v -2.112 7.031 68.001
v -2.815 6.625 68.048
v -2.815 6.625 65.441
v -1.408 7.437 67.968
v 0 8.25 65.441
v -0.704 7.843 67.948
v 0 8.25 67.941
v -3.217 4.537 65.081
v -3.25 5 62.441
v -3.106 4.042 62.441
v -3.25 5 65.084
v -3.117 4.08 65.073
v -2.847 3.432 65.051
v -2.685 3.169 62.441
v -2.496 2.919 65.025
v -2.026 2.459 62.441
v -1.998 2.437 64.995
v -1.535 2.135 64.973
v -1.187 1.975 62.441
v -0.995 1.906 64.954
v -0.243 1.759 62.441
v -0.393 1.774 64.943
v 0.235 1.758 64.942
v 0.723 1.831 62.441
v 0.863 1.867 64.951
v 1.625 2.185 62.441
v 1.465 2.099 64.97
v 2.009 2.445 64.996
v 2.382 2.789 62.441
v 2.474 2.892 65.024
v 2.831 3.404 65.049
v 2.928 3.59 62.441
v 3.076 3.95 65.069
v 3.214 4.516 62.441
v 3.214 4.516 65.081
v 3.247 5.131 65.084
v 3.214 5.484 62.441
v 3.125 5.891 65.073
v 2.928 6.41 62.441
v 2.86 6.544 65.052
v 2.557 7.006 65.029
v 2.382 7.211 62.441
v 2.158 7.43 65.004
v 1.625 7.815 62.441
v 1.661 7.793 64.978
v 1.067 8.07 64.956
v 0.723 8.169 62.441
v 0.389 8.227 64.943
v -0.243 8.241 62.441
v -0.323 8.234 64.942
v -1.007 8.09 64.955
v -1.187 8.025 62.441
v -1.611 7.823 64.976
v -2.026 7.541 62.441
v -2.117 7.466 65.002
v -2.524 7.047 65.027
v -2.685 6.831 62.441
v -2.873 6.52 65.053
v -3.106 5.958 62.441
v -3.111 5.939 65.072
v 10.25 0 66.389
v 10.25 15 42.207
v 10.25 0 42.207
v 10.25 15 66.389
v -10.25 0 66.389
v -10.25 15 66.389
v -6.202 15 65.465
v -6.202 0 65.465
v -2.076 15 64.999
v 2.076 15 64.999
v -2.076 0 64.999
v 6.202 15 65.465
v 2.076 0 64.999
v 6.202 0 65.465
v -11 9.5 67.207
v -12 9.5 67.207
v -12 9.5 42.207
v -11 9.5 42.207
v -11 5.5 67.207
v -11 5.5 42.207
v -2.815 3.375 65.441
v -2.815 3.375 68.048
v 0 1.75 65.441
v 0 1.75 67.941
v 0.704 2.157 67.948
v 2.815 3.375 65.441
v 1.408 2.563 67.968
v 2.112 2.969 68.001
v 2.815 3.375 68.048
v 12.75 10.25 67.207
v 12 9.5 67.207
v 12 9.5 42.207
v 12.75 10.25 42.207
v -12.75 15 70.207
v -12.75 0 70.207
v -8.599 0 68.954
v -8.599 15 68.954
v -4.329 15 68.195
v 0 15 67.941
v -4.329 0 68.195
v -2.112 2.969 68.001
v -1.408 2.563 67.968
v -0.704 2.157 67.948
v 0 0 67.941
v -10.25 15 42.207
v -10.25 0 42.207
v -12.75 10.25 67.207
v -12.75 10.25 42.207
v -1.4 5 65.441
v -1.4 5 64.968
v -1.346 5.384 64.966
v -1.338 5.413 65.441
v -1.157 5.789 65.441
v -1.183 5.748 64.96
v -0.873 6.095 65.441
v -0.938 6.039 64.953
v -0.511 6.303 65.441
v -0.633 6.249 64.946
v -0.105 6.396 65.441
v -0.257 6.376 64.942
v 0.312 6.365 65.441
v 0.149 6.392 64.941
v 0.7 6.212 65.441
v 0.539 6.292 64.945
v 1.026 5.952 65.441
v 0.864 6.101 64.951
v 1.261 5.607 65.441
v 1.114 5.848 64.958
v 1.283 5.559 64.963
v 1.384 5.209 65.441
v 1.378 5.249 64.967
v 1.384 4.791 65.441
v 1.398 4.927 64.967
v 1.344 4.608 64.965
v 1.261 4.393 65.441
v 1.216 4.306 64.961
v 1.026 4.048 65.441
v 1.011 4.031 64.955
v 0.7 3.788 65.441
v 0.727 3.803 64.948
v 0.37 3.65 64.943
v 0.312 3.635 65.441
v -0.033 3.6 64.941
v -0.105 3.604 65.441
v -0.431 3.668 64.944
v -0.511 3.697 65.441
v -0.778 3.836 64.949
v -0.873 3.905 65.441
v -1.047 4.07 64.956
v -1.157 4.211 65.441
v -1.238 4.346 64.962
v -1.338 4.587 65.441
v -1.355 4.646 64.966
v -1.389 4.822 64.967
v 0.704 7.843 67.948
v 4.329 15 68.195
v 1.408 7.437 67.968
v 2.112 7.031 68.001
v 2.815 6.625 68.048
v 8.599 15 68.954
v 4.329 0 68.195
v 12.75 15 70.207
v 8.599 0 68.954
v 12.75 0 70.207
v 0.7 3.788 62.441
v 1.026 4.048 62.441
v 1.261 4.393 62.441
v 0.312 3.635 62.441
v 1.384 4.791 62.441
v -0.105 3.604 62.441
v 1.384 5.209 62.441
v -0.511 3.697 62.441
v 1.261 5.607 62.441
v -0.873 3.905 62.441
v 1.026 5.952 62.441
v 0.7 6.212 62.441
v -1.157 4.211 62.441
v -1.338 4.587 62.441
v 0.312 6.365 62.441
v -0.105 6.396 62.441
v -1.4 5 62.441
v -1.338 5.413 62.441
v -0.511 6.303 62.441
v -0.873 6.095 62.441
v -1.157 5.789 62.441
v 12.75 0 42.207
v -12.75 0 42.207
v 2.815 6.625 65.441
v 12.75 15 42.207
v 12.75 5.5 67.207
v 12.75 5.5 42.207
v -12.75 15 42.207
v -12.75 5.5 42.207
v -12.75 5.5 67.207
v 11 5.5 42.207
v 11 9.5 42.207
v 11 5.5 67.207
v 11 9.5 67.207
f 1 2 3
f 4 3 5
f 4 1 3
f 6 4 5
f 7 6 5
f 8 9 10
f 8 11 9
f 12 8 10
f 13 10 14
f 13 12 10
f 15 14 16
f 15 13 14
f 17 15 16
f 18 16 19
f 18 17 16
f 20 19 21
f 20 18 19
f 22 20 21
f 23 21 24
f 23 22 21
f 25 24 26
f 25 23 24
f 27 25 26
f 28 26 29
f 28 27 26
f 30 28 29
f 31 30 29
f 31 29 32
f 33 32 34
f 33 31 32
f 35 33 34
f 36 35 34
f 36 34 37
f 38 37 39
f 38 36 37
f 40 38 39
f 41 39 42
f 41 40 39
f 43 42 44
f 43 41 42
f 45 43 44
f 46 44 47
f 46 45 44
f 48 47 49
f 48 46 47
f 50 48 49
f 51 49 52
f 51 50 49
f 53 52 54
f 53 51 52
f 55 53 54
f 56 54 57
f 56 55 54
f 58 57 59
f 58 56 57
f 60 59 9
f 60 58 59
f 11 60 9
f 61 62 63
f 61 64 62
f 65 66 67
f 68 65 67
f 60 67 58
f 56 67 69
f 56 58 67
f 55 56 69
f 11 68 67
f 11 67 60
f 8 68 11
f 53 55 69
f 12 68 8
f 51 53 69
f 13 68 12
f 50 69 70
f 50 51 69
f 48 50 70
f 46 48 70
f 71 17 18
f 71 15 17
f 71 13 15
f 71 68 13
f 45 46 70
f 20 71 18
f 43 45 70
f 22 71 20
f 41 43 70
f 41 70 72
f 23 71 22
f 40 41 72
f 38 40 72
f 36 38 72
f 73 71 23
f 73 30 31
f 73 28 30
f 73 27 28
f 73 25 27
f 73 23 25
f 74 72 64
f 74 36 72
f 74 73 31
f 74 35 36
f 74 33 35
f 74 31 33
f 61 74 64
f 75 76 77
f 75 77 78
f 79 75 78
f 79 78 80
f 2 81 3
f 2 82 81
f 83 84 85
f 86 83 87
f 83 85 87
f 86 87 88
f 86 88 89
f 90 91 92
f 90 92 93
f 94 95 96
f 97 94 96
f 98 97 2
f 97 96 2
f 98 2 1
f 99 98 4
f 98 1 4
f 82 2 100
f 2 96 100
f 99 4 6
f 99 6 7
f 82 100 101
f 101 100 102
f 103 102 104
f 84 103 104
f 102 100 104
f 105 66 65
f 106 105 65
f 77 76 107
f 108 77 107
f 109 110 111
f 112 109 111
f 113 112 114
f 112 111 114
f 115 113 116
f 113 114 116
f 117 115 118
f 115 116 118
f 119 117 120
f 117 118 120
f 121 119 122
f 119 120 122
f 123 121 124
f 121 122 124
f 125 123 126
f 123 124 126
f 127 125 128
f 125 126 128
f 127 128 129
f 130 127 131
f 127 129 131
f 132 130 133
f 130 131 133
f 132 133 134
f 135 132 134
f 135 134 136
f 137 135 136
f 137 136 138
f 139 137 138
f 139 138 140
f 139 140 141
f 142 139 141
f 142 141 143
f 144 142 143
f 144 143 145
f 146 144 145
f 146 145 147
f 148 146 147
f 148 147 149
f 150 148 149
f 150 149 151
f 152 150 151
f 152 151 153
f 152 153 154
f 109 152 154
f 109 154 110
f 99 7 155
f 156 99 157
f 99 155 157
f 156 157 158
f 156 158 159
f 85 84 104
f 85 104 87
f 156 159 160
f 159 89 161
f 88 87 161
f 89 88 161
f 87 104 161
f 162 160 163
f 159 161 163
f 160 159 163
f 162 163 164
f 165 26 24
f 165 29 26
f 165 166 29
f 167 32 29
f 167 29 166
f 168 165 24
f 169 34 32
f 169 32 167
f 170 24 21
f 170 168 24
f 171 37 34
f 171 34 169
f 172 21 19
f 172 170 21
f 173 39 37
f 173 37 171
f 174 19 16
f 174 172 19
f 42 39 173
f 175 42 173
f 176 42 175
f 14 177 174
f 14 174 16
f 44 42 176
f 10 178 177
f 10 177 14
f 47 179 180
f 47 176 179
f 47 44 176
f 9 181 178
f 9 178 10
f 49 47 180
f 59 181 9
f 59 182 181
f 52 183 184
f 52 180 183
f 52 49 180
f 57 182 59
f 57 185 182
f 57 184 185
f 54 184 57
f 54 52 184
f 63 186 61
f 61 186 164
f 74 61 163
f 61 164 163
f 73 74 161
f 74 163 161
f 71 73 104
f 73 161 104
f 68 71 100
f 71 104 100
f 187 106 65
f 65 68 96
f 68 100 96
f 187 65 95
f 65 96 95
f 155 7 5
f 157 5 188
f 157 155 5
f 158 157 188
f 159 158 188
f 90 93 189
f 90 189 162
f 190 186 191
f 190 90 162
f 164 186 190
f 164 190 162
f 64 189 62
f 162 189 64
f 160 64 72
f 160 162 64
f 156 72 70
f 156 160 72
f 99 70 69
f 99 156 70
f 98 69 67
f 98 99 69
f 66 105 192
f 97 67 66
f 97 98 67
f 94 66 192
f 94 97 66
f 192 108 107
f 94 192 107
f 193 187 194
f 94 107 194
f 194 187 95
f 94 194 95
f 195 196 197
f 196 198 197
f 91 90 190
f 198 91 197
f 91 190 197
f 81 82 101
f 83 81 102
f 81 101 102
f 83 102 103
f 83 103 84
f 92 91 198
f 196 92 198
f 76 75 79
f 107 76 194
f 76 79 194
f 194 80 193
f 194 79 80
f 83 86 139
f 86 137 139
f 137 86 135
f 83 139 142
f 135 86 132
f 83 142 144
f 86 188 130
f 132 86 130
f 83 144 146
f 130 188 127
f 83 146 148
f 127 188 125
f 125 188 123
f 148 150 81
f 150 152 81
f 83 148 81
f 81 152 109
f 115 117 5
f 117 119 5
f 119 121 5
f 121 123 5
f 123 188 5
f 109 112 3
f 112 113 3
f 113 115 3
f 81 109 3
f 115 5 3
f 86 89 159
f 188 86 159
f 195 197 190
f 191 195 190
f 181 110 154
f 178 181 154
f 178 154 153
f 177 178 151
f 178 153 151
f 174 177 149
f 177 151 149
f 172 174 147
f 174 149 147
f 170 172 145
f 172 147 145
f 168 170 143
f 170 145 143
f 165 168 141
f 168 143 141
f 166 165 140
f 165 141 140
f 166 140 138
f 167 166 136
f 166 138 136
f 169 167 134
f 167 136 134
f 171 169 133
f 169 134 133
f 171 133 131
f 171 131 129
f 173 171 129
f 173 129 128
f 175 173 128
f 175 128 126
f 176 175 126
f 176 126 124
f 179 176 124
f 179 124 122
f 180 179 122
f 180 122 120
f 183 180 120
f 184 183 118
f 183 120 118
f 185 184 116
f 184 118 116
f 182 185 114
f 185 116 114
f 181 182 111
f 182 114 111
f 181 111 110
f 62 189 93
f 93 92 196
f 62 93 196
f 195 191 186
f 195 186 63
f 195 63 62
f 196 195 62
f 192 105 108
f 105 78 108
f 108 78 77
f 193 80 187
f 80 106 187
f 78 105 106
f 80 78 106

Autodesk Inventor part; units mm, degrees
sketch "Эскиз1" plane through (0, 0, 0) normal (0, 1, 0) x (-1, 0, 0)
  line L0 (0, 56.6418) -> (23.7825, 76.5969) construction
  line L1 (44.1942, 76.014) -> (76.014, 44.1942) construction
  line L2 (91.1, 52.2091) -> (52.2091, 91.1) construction
  line L3 (0, 0) -> (74.2462, 74.2462) construction
  arc A0 (92.5543, 49.5852) -> (48.7014, 93.0224) centre (0, 0) ccw construction
  line L4 (52.2091, 91.1) -> (48.6736, 87.5645) construction
  arc A1 (44.1942, 83.085) -> (44.1942, 76.014) centre (47.7297, 79.5495) ccw construction
  line L5 (52.2091, 91.1) -> (48.6736, 87.5645) construction
  line L6 (48.6736, 87.5645) -> (52.2091, 91.1) construction
  spline S0 degree 2 poles (48.6736, 87.5645) (52.2091, 91.1) (48.7014, 93.0224) knots 1 1 1 2 2 2 construction
  line L7 (52.2091, 91.1) -> (48.7014, 93.0224) construction
  line L8 (52.2091, 91.1) -> (48.7014, 93.0224) construction
  arc A2 (48.7014, 93.0224) -> (44.0271, 95.3237) centre (0, 0) ccw construction
  arc A3 (44.0271, 95.3237) -> (43.577, 95.5303) centre (0, 0) ccw construction
  line L9 (42.6652, 95.941) -> (43.577, 95.5303) construction
  line L10 (42.6652, 95.941) -> (43.577, 95.5303) construction
  spline S1 degree 2 poles (42.0492, 94.5734) (42.6652, 95.941) (43.577, 95.5303) knots 1 1 1 2 2 2 construction
  line L11 (42.0492, 94.5734) -> (42.6652, 95.941) construction
  line L12 (42.6652, 95.941) -> (42.0492, 94.5734) construction
  line L13 (0, 0) -> (0, 209.8821) construction
  spline S2 degree 2 poles (-48.6736, 87.5645) (-52.2091, 91.1) (-48.7014, 93.0224) knots 1 1 1 2 2 2 construction
  line L14 (-48.6736, 87.5645) -> (-52.2091, 91.1) construction
  line L15 (-52.2091, 91.1) -> (-48.7014, 93.0224) construction
  arc A4 (-44.1942, 76.014) -> (-44.1942, 83.085) centre (-47.7297, 79.5495) ccw construction
  line L16 (-44.1942, 76.014) -> (-76.014, 44.1942) construction
  arc A5 (-48.7014, 93.0224) -> (-92.5543, 49.5852) centre (0, 0) ccw construction
  arc A6 (-83.085, 44.1942) -> (-76.014, 44.1942) centre (-79.5495, 47.7297) ccw construction
  line L17 (-83.085, 44.1942) -> (-87.3563, 48.4654) construction
  spline S3 degree 2 poles (-48.6736, -87.5645) (-52.2091, -91.1) (-48.7014, -93.0224) knots 1 1 1 2 2 2 construction
  line L18 (-48.6736, -87.5645) -> (-52.2091, -91.1) construction
  line L19 (-52.2091, -91.1) -> (-48.7014, -93.0224) construction
  circle A7 centre (0, 0) radius 35 construction
  line L20 (-46.3155, -73.8927) -> (-73.8927, -46.3155) construction
  arc A8 (-73.8927, -46.3155) -> (-85.2064, -46.3155) centre (-79.5495, -51.9723) ccw construction
  line L21 (-85.2064, -46.3155) -> (-87.5645, -48.6736) construction
  line L22 (-87.5645, -48.6736) -> (-91.1, -52.2091) construction
  spline S4 degree 2 poles (-87.5645, -48.6736) (-91.1, -52.2091) (-92.5543, -49.5852) knots 1 1 1 2 2 2 construction
  line L23 (-91.1, -52.2091) -> (-92.5543, -49.5852) construction
  arc A9 (-92.5543, -49.5852) -> (-48.7014, -93.0224) centre (0, 0) ccw construction
  arc A10 (-92.5543, 49.5852) -> (-92.5543, -49.5852) centre (0, 0) ccw construction
  line L24 (48.6736, -87.5645) -> (46.3155, -85.2064) construction
  arc A11 (-46.3155, -85.2064) -> (-46.3155, -73.8927) centre (-51.9723, -79.5495) ccw construction
  line L25 (-48.6736, -87.5645) -> (-46.3155, -85.2064) construction
  arc A12 (-48.7014, -93.0224) -> (48.7014, -93.0224) centre (0, 0) ccw construction
  arc A13 (46.3155, -73.8927) -> (46.3155, -85.2064) centre (51.9723, -79.5495) ccw construction
  arc A14 (43.577, 95.5303) -> (-43.577, 95.5303) centre (0, 0) ccw construction
  arc A15 (23.7825, 76.5969) -> (0, 67.941) centre (0, 104.941) ccw construction
  line L26 (0, 56.6418) -> (-35.5516, 86.4744) construction
  line L27 (44.0271, 95.3237) -> (44.0271, 127.8162) construction
  ellipse E0 centre (0, 102.7511) end of major axis (44.0271, 102.7511) minor radius 27.5932 (42.0492, 94.5734) -> (35.2734, 86.2384) ccw construction
  line L28 (42.6652, 95.941) -> (-42.6652, 95.941) construction
  ellipse E1 centre (0, 102.7511) end of major axis (44.5159, 105.2445) minor radius 28.887 (35.2734, 86.2384) -> (42.0492, 94.5734) ccw construction
  line L29 (23.7825, 76.5969) -> (35.2734, 86.2384) construction
  arc A16 (0, 67.941) -> (23.7825, 76.5969) centre (0, 104.941) ccw
  arc A17 (-23.7825, 76.5969) -> (0, 67.941) centre (0, 104.941) ccw
  line L30 (-23.7825, 76.5969) -> (-35.2734, 86.2384) construction
  line L31 (-42.6652, 95.941) -> (-42.0492, 94.5734) construction
  arc A18 (-43.577, 95.5303) -> (-48.7014, 93.0224) centre (0, 0) ccw construction
  line L32 (-42.6652, 95.941) -> (-43.577, 95.5303) construction
  spline S5 degree 2 poles (-42.0492, 94.5734) (-42.6652, 95.941) (-43.577, 95.5303) knots 1 1 1 2 2 2 construction
  line L33 (-42.0492, 94.5734) -> (-42.6652, 95.941) construction
  line L34 (-42.6652, 95.941) -> (-43.577, 95.5303) construction
  line L35 (-42.6652, 95.941) -> (-43.577, 95.5303) construction
  spline S6 degree 2 poles (-42.0492, 94.5734) (-42.6652, 95.941) (-43.577, 95.5303) knots 1 1 1 2 2 2 construction
  line L36 (-42.0492, 94.5734) -> (-42.6652, 95.941) construction
  ellipse E2 centre (0, 102.7511) end of major axis (-44.5159, 105.2445) minor radius 28.887 (-42.0492, 94.5734) -> (-35.2734, 86.2384) ccw construction
  line L37 (83.085, 44.1942) -> (87.5645, 48.6736) construction
  arc A19 (76.014, 44.1942) -> (83.085, 44.1942) centre (79.5495, 47.7297) ccw construction
  spline S7 degree 2 poles (48.6736, -87.5645) (52.2091, -91.1) (48.7014, -93.0224) knots 1 1 1 2 2 2 construction
  line L38 (48.6736, -87.5645) -> (52.2091, -91.1) construction
  line L39 (52.2091, -91.1) -> (48.7014, -93.0224) construction
  line L40 (46.3155, -73.8927) -> (73.8927, -46.3155) construction
  arc A20 (85.2064, -46.3155) -> (73.8927, -46.3155) centre (79.5495, -51.9723) ccw construction
  line L41 (85.2064, -46.3155) -> (87.5645, -48.6736) construction
  spline S8 degree 2 poles (87.5645, -48.6736) (91.1, -52.2091) (92.5543, -49.5852) knots 1 1 1 2 2 2 construction
  line L42 (87.5645, -48.6736) -> (91.1, -52.2091) construction
  line L43 (91.1, -52.2091) -> (92.5543, -49.5852) construction
  arc A21 (92.5543, -49.5852) -> (92.5543, 49.5852) centre (0, 0) ccw construction
  arc A22 (48.7014, -93.0224) -> (92.5543, -49.5852) centre (0, 0) ccw construction
  arc A23 (28.5452, 71.4571) -> (-28.5452, 71.4571) centre (0, 104.941) ccw construction
  line L44 (-83.085, 34.2947) -> (-90.6891, 41.8987) construction
  line L45 (-93.5297, 47.6709) -> (-92.5543, 49.5852) construction
  line L46 (-29.1816, 81.127) -> (-76.014, 34.2947) construction
  arc A24 (-83.085, 34.2947) -> (-76.014, 34.2947) centre (-79.5495, 37.8302) ccw construction
  line L47 (-34.1491, 76.1596) -> (-28.5452, 71.4571) construction
  arc A25 (-30.6393, 73.2144) -> (-37.3889, 72.9198) centre (-33.8534, 69.3842) ccw construction
  arc A26 (-90.6891, 41.8987) -> (-87.3563, 48.4654) centre (0, 0) ccw construction
  arc A27 (37.3889, 72.9198) -> (30.6393, 73.2144) centre (33.8534, 69.3842) ccw construction
  line L48 (29.1816, 81.127) -> (76.014, 34.2947) construction
  arc A28 (76.014, 34.2947) -> (83.085, 34.2947) centre (79.5495, 37.8302) ccw construction
  line L49 (83.085, 34.2947) -> (90.6891, 41.8987) construction
  arc A29 (76.014, 44.1942) -> (83.085, 44.1942) centre (79.5495, 47.7297) ccw construction
  line L50 (44.1942, 76.014) -> (76.014, 44.1942) construction
  arc A30 (44.1942, 83.085) -> (44.1942, 76.014) centre (47.7297, 79.5495) ccw construction
  arc A31 (5.5413, 61.2914) -> (28.5452, 71.4571) centre (0, 104.941) ccw
  arc A32 (-28.5452, 71.4571) -> (5.5413, 61.2914) centre (0, 104.941) ccw
  line L51 (34.1491, 76.1596) -> (28.5452, 71.4571) construction
  arc A33 (-87.3563, 48.4654) -> (-90.6891, 41.8987) centre (0, 0) ccw construction
  line L52 (83.085, 44.1942) -> (87.3563, 48.4654) construction
  arc A34 (90.6891, 41.8987) -> (87.3563, 48.4654) centre (0, 0) ccw construction
  line L53 (-44.1942, 83.085) -> (-48.6736, 87.5645) construction
  line L54 (44.0271, 95.3237) -> (43.577, 95.5303) construction
  line L55 (48.6736, 87.5645) -> (44.1942, 83.085) construction
  line L56 (0, 104.941) -> (-23.6028, 54.3247) construction
  circle A35 centre (31.1916, 76.2887) radius 2 construction
  line L57 (29.1816, 81.127) -> (23.7825, 76.5969)
  line L58 (29.1816, 81.127) -> (34.1491, 76.1596)
  line L59 (34.1491, 76.1596) -> (28.5452, 71.4571)
  line L60 (-28.5452, 71.4571) -> (-34.1491, 76.1596)
  line L61 (-23.7825, 76.5969) -> (-29.1816, 81.127)
  line L62 (-29.1816, 81.127) -> (-34.1491, 76.1596)
  arc A36 (-26.6462, 78.9996) -> (-31.2232, 73.7044) centre (-28.9734, 76.3855) ccw
  arc A37 (31.2232, 73.7044) -> (26.6462, 78.9996) centre (28.9734, 76.3855) ccw
  line L63 (12.75, 58.0269) -> (-12.75, 58.0269)
  line L64 (0, 67.941) -> (0, 64.941) construction
  line L65 (-12.75, 58.0269) -> (-12.75, 67.2072) construction
  line L66 (12.75, 58.0269) -> (12.75, 67.2072) construction
  arc A38 (-12.75, 67.2072) -> (12.75, 67.2072) centre (0, 101.941) ccw
  line L67 (12.75, 67.2072) -> (12.75, 70.2072)
  line L68 (-12.75, 70.2072) -> (-12.75, 70.2072) construction
  line L69 (-12.75, 67.2072) -> (-12.75, 70.2072)
  line L70 (10.1, 59.4125) -> (-10.1, 59.4125) construction
  point P0 (60.1041, 60.1041)
  point P1 (40.6586, 79.5495)
  point P2 (79.5495, 40.6586)
  point P3 (0, 105)
  point P4 (-87.5645, 48.6736)
  point P5 (-23.542, 76.3968)
  point P6 (-34.9935, 86.0061)
  point P7 (0, 95.941)
  point P8 (-94.5192, 45.7288)
  point P9 (-13.2817, 58.6489)
  point P10 (-28.5452, 71.4571)
  point P11 (13.2817, 58.6489)
  point P12 (-15.6369, 71.4076)
  point P13 (-26.8032, 79.1314)
  point P14 (-31.2232, 73.7044)
  point P15 (26.8032, 79.1314)
  dimension "d67" = 44.5856
  dimension "d48" = 74
  dimension "d49" = 100
  dimension "d50" = 28
  dimension "d51" = 15
  dimension "d52" = 45
  dimension "d53" = 55
  dimension "d54" = 16.3348
  dimension "d55" = 27.5
  dimension "d56" = 5
  dimension "d57" = 5
  dimension "d58" = 1
  dimension "d59" = 1.5
  dimension "d60" = 1.5
  dimension "d61" = 1
  dimension "d62" = 4
  dimension "d63" = 70
  dimension "d64" = 85
  dimension "d65" = 105
  dimension "d66" = 1.3619
  dimension "d68" = 88
  dimension "d69" = 7
  dimension "d70" = 5
  dimension "d71" = 7
  dimension "d72" = 5
  dimension "d73" = 7
  dimension "d74" = 5
  dimension "d75" = 5.1
  dimension "d78" = 4
  dimension "d166" = 25.5
  dimension "d169" = 3
  dimension "d171" = 3
  dimension "d172" = 3
  dimension "d173" = 20.2
extrude "Выдавливание7" add sketch "Эскиз1" along normal blind 15 contours A16 L67 A38 L69 A17
ref_plane "РабПлоскость1" through (12.75, 15, 67.2072) normal (0, 0, 1) x (-1, 0, 0)
sketch "Эскиз6" plane through (12.75, 15, 67.2072) normal (0, 0, 1) x (-1, 0, 0)
  line L0 (0, 15) -> (25.5, 15) construction
  line L1 (25.5, 15) -> (25.5, 0) construction
  line L2 (0, 0) -> (25.5, 0) construction
  line L3 (0, 15) -> (0, 0) projected
  line L4 (25.5, 0) -> (0, 0) construction
  line L5 (12.75, 0) -> (12.75, 15) construction
  line L6 (12.75, 0) -> (-0.25, 0) construction
  line L7 (-0.25, 0) -> (-0.25, 15) construction
  line L8 (-0.25, 15) -> (12.75, 15) construction
  line L9 (12.75, 15) -> (12.75, 0) construction
  line L10 (-0.25, 6) -> (1.25, 6) construction
  line L11 (1.25, 6) -> (1.25, 9) construction
  line L12 (1.25, 9) -> (-0.25, 9) construction
  line L13 (-0.25, 9) -> (-0.25, 6) construction
  line L14 (0, 5.5) -> (1.75, 5.5)
  line L15 (1.75, 5.5) -> (1.75, 9.5)
  line L16 (1.75, 9.5) -> (0, 9.5)
  line L17 (0, 9.5) -> (0, 6) construction
  line L18 (25.5, 15) -> (0, 15) construction
  line L19 (12.75, 0) -> (2.5, 0) construction
  line L20 (2.5, 0) -> (2.5, 15)
  line L21 (2.5, 15) -> (12.75, 15) construction
  line L22 (12.75, 15) -> (12.75, 0) construction
  line L23 (0, 0) -> (2.5, 0)
  line L24 (0, 6) -> (0, 5.5)
  line L25 (0, 15) -> (2.5, 15)
  line L26 (25.5, 15) -> (25.5, 0)
  line L27 (24.25, 6) -> (24.25, 9) construction
  line L28 (25.5, 5.5) -> (23.75, 5.5)
  line L29 (23.75, 5.5) -> (23.75, 9.5)
  line L30 (23.75, 9.5) -> (25.5, 9.5)
  line L31 (25.5, 9.5) -> (25.5, 6) construction
  line L32 (23, 0) -> (23, 15)
  line L33 (25.5, 0) -> (23, 0)
  line L34 (25.5, 6) -> (25.5, 5.5)
  line L35 (25.5, 15) -> (23, 15)
  line L36 (1.25, 6) -> (-0.25, 4.5)
  line L37 (1.25, 6) -> (3.3713, 6) construction
  line L38 (24.25, 6) -> (25.75, 4.5)
  point P0 (0, 9.5)
  point P1 (0, 5.5)
  point P2 (25.5, 4.75)
  point P3 (24.75, 5.5)
  point P4 (0.75, 5.5)
  point P5 (0, 4.75)
  dimension "d177" = 13
  dimension "d178" = 1.5
  dimension "d179" = 3
  dimension "d180" = 6
  dimension "d181" = 0.5
  dimension "d182" = 0.5
  dimension "d183" = 0.5
  dimension "d184" = 10.25
  dimension "d199" = 135
extrude "Выдавливание8" add sketch "Эскиз6" against normal blind 25 contours L25 L20 L23 L3 L36 L14 L15 L16 | L26 L30 L29 L28 L38 L33 L32 L35
sketch "Эскиз7" plane through (0, 15, 0) normal (0, 1, 0) x (1, 0, 0)
  line L0 (-12.75, -70.2072) -> (-12.75, -42.2072) construction
  arc A0 (12.75, -70.2072) -> (-12.75, -70.2072) centre (0, -104.941) ccw construction
  line L1 (12.75, -70.2072) -> (12.75, -42.2072) construction
  line L2 (10.25, -42.2072) -> (12.75, -42.2072) construction
  line L3 (10.25, -66.3891) -> (10.25, -42.2072) construction
  arc A1 (10.25, -66.3891) -> (-10.25, -66.3891) centre (0, -101.941) ccw construction
  line L4 (-10.25, -66.3891) -> (-10.25, -42.2072) construction
  line L5 (-12.75, -42.2072) -> (-10.25, -42.2072) construction
  arc A2 (12.75, -70.2072) -> (-12.75, -70.2072) centre (0, -104.941) ccw construction
  point P0 (0, 0)
  point P1 (0, -67.941)
  point P2 (0, -64.941)
ref_plane "РабПлоскость2" through (0, 15, 67.941) normal (0, 0, -1) x (-1, 0, 0)
sketch "Эскиз8" plane through (0, 15, 67.941) normal (0, 0, -1) x (-1, 0, 0)
  line L0 (-12.75, -15) -> (-10.25, -15) construction
  line L1 (-10.25, -15) -> (-10.25, 0) construction
  line L2 (-10.25, 0) -> (-12.75, 0) construction
  line L3 (-12.75, 0) -> (-12.75, -4.75) construction
  line L4 (-12, -5.5) -> (-11, -5.5) construction
  line L5 (-11, -5.5) -> (-11, -9.5) construction
  line L6 (-11, -9.5) -> (-12.75, -9.5) construction
  line L7 (-12.75, -9.5) -> (-12.75, -15) construction
  line L8 (12.75, 0) -> (10.25, 0) construction
  line L9 (10.25, 0) -> (10.25, -15) construction
  line L10 (10.25, -15) -> (12.75, -15) construction
  line L11 (12.75, -15) -> (12.75, -9.5) construction
  line L12 (12.75, -9.5) -> (11, -9.5) construction
  line L13 (11, -9.5) -> (11, -5.5) construction
  line L14 (11, -5.5) -> (12, -5.5) construction
  line L15 (12.75, -4.75) -> (12.75, 0) construction
  line L16 (10.25, -15) -> (10.25, 0) construction
  line L17 (-10.25, 0) -> (10.25, 0) construction
  line L18 (-10.25, 0) -> (-10.25, -15) construction
  line L19 (-10.25, -15) -> (10.25, -15) construction
  line L20 (-11, -5.5) -> (-11, -9.5) construction
  line L21 (11, -5.5) -> (11, -9.5) construction
  line L22 (10.25, 0) -> (-10.25, 0) construction
  line L23 (0, 0) -> (0, -15) construction
  line L24 (12, -5.5) -> (12.75, -4.75) projected
  line L25 (-12.75, -4.75) -> (-12, -5.5) projected
  line L26 (0, 0) -> (0, -10) construction
  circle A0 centre (0, -10) radius 3.25
  line L27 (0, -10) -> (0, -6.75) construction
  line L28 (0, -10) -> (-2.8146, -8.375) construction
  line L29 (0, -10) -> (2.8146, -8.375) construction
  line L30 (0, -10) -> (-3.25, -10) construction
  line L31 (0, -10) -> (0, -13.25) construction
  line L32 (0, -10) -> (-2.8146, -11.625) construction
  line L33 (0, -10) -> (2.8146, -11.625) construction
  line L34 (2.8146, -11.625) -> (2.8146, -8.375)
  line L35 (2.8146, -8.375) -> (0, -6.75)
  line L36 (0, -6.75) -> (-2.8146, -8.375)
  line L37 (2.8146, -11.625) -> (0, -13.25)
  line L38 (0, -13.25) -> (-2.8146, -11.625)
  line L39 (-2.8146, -11.625) -> (-2.8146, -8.375)
  circle A1 centre (0, -10) radius 1.4
  dimension "d202" = 10
  dimension "d203" = 6.5
  dimension "d204" = 60
  dimension "d205" = 2.8
ref_plane "РабПлоскость3" through (0, 15, 65.941) normal (0, 0, 1) x (1, 0, 0)
sketch "Эскиз9" plane through (0, 15, 65.941) normal (0, 0, 1) x (1, 0, 0)
  circle A0 centre (0, -11.1261) radius 1.65 projected
  circle A1 centre (0, -11.1261) radius 3
  point P0 (0, -15)
  dimension "d196" = 6
extrude "Выдавливание12" cut sketch "Эскиз6" against normal blind 25 contours L16 L15 L14 L3 | L14 L36 L3 | L26 L28 L29 L30 | L26 L38 L28
extrude "Выдавливание13" cut sketch "Эскиз8" along normal mid plane 10 contours A1
extrude "Выдавливание15" add sketch "Эскиз8" along normal blind 5.5
extrude "Выдавливание14" cut sketch "Эскиз8" along normal blind 2.5 and the other way blind 5 contours L34 L37 L38 L39 L36 L35
properties part number "kicker_head"
